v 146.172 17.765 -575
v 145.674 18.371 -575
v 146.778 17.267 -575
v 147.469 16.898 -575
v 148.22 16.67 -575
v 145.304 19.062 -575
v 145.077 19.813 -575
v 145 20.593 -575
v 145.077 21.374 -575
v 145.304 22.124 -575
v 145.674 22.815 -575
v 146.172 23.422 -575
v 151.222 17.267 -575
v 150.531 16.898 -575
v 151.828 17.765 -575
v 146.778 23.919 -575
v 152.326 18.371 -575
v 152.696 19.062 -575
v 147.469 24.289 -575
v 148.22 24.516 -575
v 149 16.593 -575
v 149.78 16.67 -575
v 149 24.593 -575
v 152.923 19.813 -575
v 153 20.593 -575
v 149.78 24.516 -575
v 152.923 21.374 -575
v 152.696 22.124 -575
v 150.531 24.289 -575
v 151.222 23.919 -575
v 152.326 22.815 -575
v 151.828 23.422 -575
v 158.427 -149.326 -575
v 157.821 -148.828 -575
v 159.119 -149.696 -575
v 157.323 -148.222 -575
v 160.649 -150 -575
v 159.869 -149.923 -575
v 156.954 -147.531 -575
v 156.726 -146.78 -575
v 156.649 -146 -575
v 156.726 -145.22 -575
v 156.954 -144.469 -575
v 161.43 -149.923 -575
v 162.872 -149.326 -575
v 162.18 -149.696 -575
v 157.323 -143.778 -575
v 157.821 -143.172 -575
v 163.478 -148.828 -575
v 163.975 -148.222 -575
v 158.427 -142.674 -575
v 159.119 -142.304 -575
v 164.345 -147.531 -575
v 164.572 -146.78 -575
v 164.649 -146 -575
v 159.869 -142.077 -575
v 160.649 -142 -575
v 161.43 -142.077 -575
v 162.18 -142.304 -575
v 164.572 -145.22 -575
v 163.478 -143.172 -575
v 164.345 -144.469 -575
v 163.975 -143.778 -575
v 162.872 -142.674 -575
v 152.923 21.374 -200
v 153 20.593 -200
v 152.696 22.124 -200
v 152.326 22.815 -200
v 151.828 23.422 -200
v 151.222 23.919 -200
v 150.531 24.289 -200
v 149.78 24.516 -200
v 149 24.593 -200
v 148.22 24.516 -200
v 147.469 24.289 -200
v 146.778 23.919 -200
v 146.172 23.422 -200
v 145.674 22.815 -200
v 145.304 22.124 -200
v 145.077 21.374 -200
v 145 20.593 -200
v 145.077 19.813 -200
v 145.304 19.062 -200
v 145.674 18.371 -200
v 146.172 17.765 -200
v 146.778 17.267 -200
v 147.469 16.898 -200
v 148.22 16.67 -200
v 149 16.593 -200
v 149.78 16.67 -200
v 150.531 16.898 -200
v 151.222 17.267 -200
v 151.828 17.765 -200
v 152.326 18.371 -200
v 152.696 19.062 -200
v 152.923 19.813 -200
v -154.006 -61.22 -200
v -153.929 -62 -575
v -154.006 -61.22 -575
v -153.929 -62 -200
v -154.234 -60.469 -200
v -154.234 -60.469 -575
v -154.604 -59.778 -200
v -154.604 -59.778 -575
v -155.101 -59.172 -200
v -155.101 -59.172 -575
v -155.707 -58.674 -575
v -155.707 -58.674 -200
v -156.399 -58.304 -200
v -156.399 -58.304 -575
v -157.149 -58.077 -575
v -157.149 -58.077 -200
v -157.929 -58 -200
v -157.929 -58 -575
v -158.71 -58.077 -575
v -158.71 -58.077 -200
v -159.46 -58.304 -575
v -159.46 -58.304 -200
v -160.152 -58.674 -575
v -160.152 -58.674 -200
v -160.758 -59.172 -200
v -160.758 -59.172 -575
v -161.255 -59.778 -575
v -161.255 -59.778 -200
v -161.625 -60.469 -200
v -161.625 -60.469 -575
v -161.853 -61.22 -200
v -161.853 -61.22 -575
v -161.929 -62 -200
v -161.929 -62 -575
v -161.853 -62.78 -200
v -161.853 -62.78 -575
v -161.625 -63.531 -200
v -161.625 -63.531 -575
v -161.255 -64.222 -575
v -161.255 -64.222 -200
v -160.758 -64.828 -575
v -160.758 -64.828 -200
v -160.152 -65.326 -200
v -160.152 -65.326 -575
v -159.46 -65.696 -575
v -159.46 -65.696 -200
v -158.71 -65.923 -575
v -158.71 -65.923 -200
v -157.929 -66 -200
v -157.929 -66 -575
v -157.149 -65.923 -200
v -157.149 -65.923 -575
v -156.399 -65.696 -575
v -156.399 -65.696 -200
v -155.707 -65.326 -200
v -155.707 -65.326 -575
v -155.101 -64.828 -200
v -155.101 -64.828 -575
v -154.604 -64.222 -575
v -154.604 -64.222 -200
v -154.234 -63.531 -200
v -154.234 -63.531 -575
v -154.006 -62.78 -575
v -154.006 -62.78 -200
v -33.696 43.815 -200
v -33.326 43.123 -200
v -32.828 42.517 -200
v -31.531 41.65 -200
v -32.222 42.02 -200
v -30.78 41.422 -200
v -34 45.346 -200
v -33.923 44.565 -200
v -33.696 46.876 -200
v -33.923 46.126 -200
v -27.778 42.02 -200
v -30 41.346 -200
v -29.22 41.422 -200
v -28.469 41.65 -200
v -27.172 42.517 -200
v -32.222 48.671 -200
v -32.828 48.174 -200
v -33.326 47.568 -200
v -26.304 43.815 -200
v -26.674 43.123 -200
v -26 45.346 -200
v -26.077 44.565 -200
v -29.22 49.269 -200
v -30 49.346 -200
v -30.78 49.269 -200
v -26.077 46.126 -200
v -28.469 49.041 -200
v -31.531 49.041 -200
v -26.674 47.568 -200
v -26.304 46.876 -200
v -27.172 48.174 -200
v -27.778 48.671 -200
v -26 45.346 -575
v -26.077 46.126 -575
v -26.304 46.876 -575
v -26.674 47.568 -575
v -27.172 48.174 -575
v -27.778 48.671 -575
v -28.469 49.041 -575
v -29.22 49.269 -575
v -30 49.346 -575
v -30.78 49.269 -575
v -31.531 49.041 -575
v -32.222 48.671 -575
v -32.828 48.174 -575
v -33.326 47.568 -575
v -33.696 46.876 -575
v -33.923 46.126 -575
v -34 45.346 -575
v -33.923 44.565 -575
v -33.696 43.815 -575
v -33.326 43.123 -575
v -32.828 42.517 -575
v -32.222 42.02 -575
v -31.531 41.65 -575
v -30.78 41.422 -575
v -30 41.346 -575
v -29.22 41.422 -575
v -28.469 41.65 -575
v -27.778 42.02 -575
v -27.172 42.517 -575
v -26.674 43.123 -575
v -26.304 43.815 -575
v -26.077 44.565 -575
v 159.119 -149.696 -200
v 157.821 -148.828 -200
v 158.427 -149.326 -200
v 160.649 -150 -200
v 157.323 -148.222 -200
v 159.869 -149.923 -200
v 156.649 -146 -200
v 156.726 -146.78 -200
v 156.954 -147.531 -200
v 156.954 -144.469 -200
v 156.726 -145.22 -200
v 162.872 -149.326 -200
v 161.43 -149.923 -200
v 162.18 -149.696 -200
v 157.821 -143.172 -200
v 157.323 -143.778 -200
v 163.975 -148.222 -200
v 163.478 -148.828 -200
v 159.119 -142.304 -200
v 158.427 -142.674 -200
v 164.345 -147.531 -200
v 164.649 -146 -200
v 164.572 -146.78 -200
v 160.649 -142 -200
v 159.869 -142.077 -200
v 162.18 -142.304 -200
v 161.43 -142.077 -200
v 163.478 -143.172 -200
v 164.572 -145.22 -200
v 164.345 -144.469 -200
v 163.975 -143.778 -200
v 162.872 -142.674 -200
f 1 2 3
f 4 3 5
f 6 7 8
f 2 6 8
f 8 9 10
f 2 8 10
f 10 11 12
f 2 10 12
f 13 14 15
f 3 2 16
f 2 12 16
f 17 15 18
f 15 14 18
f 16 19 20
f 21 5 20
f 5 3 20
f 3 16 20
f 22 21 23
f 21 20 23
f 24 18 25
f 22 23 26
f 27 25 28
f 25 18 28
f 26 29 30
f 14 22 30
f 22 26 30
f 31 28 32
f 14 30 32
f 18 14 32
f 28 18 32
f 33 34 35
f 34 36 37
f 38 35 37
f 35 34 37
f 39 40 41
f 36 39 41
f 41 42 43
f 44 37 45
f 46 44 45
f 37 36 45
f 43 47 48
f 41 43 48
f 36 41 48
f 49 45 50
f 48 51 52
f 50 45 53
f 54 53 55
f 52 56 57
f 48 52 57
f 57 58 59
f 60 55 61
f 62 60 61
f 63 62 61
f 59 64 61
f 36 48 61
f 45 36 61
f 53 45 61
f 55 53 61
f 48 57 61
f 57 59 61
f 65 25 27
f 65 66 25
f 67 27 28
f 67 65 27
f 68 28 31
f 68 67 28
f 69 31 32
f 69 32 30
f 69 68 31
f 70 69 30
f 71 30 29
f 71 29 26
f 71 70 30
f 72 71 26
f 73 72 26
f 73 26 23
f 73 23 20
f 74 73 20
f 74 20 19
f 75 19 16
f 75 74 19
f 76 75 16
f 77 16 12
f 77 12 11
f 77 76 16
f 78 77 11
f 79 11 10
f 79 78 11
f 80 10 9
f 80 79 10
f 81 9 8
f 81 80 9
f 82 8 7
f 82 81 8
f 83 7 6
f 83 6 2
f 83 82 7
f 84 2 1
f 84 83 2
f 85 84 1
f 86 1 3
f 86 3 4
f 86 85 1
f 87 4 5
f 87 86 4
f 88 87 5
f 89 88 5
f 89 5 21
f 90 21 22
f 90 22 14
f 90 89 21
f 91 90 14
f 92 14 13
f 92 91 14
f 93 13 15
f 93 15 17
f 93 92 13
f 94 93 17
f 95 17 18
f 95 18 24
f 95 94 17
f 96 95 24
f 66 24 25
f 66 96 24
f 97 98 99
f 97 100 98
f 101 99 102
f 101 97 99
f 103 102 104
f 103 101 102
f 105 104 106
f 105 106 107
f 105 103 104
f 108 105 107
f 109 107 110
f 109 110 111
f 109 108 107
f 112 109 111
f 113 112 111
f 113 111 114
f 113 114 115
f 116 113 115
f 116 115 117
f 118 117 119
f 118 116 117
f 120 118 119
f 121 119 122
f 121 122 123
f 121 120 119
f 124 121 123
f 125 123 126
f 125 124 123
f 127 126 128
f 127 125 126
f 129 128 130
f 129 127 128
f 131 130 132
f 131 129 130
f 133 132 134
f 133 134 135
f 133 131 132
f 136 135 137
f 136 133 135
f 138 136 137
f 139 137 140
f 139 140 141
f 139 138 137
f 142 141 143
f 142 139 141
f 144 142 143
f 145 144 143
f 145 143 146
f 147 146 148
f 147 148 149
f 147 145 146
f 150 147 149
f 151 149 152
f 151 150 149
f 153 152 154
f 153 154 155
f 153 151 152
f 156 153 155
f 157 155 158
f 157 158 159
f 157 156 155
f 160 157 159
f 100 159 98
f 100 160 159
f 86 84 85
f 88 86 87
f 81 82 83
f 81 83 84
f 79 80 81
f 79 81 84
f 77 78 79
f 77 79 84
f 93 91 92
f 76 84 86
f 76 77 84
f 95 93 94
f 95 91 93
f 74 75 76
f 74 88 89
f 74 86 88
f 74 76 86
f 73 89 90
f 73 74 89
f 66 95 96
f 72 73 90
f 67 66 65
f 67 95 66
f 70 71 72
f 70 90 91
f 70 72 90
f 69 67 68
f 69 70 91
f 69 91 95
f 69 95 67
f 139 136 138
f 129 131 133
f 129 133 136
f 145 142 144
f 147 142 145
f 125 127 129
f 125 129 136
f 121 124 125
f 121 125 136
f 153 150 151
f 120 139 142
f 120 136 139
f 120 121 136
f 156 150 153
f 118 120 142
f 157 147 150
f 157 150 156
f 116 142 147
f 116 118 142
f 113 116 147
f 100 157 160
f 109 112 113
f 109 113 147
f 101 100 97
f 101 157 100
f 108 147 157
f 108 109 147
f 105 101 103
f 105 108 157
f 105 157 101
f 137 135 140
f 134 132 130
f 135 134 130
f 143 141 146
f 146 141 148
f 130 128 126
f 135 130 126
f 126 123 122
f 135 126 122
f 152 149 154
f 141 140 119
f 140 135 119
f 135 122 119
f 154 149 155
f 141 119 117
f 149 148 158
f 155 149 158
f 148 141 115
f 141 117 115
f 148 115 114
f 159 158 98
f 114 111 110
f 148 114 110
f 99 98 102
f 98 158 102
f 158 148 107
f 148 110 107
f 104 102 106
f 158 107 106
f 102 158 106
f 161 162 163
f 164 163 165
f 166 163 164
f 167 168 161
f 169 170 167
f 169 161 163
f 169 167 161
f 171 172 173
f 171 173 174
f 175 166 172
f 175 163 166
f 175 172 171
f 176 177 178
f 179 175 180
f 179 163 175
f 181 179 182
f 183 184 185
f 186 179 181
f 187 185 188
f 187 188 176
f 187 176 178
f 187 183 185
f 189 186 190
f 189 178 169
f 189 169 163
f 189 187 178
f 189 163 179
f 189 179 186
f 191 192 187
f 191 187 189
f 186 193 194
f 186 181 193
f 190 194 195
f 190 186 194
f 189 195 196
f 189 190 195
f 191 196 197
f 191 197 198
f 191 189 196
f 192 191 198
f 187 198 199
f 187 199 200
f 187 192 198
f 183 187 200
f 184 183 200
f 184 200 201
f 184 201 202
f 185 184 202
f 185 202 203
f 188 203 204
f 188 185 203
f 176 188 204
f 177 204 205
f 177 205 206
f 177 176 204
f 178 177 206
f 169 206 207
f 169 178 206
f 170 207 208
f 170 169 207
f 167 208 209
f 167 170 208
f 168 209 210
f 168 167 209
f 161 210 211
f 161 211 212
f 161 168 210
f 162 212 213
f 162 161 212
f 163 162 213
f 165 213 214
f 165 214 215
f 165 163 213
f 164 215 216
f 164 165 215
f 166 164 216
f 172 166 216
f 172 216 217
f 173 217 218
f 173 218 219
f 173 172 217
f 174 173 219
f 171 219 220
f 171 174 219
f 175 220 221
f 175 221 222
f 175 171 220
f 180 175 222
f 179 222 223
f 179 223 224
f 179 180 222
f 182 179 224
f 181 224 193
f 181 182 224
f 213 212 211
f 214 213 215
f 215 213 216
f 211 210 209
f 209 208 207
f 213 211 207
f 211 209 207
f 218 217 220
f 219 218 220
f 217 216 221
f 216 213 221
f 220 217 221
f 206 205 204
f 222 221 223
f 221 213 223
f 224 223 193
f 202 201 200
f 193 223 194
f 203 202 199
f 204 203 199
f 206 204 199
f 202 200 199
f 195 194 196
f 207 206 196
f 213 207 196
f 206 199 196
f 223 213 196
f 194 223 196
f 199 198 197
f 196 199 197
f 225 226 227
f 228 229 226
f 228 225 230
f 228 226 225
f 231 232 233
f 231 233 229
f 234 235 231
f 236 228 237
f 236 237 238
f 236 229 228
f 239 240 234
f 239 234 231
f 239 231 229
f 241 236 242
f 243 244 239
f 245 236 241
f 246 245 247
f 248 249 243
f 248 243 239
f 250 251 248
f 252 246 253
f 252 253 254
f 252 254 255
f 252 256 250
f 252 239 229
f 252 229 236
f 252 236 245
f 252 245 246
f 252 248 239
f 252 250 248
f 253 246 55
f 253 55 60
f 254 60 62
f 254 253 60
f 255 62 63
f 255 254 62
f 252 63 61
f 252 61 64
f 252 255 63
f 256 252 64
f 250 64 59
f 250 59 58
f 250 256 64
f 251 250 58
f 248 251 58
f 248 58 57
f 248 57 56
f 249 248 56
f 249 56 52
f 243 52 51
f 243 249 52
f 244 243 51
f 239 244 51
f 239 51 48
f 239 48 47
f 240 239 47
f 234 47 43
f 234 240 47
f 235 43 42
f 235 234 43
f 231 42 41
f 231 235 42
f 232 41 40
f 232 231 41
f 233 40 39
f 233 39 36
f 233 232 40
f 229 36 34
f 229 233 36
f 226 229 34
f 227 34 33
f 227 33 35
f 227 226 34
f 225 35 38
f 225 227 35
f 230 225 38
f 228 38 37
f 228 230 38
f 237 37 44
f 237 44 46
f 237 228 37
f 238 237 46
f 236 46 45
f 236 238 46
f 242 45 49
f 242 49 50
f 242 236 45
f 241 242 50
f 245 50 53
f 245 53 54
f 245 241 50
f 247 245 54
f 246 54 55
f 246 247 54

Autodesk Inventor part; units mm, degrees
ref_plane "XZ Plane" through (0, 0, 0) normal (0, 1, 0) x (-1, 0, 0)
ref_plane "Reference Plane" through (0, 0, -100) normal (0, 0, 1) x (1, 0, 0)
sketch "Reference Image" plane through (0, 0, -100) normal (0, 0, 1) x (1, 0, 0)
  line L0 (-272, 203) -> (280.3854, 203) construction
  line L1 (280.3854, 203) -> (280.3854, -210.4856) construction
  line L2 (280.3854, -210.4856) -> (-272, -210.4856) construction
  line L3 (-272, -210.4856) -> (-272, 203) construction
  line L4 (280.3854, 203) -> (-272, -210.4856) construction
  line L5 (-382.4771, 0) -> (390.8625, 0) construction
  line L6 (0, 285.6971) -> (0, -293.1827) construction
  point P0 (0, 0)
  dimension "d26" = 690
  dimension "d51" = 203
  dimension "d54" = 272
sketch "Mount Reference Sketch" plane through (0, 0, -100) normal (0, 0, 1) x (1, 0, 0)
  line L0 (-157.9294, -62) -> (-30, 45.3455) construction
  line L1 (0, 285.6971) -> (0, -293.1827) construction
  line L2 (-382.4771, 0) -> (390.8625, 0) construction
  line L3 (149, 20.5932) -> (160.6493, -146) construction
  point P0 (0, 0)
  dimension "d55" = 167
  dimension "d56" = 62
  dimension "d57" = 30
  dimension "d58" = 40
  dimension "d59" = 167
  dimension "d60" = 149
  dimension "d61" = 146
  dimension "d63" = 4
ref_plane "Mount Plane" through (0, 0, -200) normal (0, 0, 1) x (1, 0, 0)
sketch "Sketch4" plane through (0, 0, -200) normal (0, 0, 1) x (1, 0, 0)
  circle A0 centre (-30, 45.3455) radius 4
  circle A1 centre (-157.9294, -62) radius 4
  circle A2 centre (149, 20.5932) radius 4
  circle A3 centre (160.6493, -146) radius 4
  point P0 (0, 0)
  dimension "d67" = 8
extrude "Mount XY Axes" add sketch "Sketch4" against normal blind 375
sketch "Sketch5" plane through (0, 0, -200) normal (0, 0, 1) x (1, 0, 0)
  circle A0 centre (-25, -125) radius 84
  circle A1 centre (143, -66) radius 37.5
  line L0 (-382.4771, 0) -> (390.8625, 0) projected
  line L1 (0, 285.6971) -> (0, -293.1827) projected
  line L2 (-220.7259, 38.2795) -> (-109, -125)
  line L3 (-102.1982, 130.9826) -> (21.1457, -54.8104)
  line L4 (-102.1982, 130.9826) -> (-220.7259, 38.2795)
  circle A2 centre (149, 20.5932) radius 4 projected
  line L5 (21.1457, -54.8104) -> (149, 20.5932)
  line L6 (149, 20.5932) -> (153, -132.2859)
  line L7 (153, -132.2859) -> (58.431, -134.7602)
  point P0 (0, 0)
  point P1 (152.2167, -102.3497)
  point P2 (150.3033, -29.218)
  point P3 (149.1046, 16.5946)
  point P4 (145.5546, 18.5612)
  dimension "d70" = 168
  dimension "d71" = 125
  dimension "d72" = 25
  dimension "d73" = 75
  dimension "d74" = 66
  dimension "d75" = 143
extrude "ROUGH Engine Block" [suppressed]
properties part number "Engine_Mount_Reference_Model_V1"
